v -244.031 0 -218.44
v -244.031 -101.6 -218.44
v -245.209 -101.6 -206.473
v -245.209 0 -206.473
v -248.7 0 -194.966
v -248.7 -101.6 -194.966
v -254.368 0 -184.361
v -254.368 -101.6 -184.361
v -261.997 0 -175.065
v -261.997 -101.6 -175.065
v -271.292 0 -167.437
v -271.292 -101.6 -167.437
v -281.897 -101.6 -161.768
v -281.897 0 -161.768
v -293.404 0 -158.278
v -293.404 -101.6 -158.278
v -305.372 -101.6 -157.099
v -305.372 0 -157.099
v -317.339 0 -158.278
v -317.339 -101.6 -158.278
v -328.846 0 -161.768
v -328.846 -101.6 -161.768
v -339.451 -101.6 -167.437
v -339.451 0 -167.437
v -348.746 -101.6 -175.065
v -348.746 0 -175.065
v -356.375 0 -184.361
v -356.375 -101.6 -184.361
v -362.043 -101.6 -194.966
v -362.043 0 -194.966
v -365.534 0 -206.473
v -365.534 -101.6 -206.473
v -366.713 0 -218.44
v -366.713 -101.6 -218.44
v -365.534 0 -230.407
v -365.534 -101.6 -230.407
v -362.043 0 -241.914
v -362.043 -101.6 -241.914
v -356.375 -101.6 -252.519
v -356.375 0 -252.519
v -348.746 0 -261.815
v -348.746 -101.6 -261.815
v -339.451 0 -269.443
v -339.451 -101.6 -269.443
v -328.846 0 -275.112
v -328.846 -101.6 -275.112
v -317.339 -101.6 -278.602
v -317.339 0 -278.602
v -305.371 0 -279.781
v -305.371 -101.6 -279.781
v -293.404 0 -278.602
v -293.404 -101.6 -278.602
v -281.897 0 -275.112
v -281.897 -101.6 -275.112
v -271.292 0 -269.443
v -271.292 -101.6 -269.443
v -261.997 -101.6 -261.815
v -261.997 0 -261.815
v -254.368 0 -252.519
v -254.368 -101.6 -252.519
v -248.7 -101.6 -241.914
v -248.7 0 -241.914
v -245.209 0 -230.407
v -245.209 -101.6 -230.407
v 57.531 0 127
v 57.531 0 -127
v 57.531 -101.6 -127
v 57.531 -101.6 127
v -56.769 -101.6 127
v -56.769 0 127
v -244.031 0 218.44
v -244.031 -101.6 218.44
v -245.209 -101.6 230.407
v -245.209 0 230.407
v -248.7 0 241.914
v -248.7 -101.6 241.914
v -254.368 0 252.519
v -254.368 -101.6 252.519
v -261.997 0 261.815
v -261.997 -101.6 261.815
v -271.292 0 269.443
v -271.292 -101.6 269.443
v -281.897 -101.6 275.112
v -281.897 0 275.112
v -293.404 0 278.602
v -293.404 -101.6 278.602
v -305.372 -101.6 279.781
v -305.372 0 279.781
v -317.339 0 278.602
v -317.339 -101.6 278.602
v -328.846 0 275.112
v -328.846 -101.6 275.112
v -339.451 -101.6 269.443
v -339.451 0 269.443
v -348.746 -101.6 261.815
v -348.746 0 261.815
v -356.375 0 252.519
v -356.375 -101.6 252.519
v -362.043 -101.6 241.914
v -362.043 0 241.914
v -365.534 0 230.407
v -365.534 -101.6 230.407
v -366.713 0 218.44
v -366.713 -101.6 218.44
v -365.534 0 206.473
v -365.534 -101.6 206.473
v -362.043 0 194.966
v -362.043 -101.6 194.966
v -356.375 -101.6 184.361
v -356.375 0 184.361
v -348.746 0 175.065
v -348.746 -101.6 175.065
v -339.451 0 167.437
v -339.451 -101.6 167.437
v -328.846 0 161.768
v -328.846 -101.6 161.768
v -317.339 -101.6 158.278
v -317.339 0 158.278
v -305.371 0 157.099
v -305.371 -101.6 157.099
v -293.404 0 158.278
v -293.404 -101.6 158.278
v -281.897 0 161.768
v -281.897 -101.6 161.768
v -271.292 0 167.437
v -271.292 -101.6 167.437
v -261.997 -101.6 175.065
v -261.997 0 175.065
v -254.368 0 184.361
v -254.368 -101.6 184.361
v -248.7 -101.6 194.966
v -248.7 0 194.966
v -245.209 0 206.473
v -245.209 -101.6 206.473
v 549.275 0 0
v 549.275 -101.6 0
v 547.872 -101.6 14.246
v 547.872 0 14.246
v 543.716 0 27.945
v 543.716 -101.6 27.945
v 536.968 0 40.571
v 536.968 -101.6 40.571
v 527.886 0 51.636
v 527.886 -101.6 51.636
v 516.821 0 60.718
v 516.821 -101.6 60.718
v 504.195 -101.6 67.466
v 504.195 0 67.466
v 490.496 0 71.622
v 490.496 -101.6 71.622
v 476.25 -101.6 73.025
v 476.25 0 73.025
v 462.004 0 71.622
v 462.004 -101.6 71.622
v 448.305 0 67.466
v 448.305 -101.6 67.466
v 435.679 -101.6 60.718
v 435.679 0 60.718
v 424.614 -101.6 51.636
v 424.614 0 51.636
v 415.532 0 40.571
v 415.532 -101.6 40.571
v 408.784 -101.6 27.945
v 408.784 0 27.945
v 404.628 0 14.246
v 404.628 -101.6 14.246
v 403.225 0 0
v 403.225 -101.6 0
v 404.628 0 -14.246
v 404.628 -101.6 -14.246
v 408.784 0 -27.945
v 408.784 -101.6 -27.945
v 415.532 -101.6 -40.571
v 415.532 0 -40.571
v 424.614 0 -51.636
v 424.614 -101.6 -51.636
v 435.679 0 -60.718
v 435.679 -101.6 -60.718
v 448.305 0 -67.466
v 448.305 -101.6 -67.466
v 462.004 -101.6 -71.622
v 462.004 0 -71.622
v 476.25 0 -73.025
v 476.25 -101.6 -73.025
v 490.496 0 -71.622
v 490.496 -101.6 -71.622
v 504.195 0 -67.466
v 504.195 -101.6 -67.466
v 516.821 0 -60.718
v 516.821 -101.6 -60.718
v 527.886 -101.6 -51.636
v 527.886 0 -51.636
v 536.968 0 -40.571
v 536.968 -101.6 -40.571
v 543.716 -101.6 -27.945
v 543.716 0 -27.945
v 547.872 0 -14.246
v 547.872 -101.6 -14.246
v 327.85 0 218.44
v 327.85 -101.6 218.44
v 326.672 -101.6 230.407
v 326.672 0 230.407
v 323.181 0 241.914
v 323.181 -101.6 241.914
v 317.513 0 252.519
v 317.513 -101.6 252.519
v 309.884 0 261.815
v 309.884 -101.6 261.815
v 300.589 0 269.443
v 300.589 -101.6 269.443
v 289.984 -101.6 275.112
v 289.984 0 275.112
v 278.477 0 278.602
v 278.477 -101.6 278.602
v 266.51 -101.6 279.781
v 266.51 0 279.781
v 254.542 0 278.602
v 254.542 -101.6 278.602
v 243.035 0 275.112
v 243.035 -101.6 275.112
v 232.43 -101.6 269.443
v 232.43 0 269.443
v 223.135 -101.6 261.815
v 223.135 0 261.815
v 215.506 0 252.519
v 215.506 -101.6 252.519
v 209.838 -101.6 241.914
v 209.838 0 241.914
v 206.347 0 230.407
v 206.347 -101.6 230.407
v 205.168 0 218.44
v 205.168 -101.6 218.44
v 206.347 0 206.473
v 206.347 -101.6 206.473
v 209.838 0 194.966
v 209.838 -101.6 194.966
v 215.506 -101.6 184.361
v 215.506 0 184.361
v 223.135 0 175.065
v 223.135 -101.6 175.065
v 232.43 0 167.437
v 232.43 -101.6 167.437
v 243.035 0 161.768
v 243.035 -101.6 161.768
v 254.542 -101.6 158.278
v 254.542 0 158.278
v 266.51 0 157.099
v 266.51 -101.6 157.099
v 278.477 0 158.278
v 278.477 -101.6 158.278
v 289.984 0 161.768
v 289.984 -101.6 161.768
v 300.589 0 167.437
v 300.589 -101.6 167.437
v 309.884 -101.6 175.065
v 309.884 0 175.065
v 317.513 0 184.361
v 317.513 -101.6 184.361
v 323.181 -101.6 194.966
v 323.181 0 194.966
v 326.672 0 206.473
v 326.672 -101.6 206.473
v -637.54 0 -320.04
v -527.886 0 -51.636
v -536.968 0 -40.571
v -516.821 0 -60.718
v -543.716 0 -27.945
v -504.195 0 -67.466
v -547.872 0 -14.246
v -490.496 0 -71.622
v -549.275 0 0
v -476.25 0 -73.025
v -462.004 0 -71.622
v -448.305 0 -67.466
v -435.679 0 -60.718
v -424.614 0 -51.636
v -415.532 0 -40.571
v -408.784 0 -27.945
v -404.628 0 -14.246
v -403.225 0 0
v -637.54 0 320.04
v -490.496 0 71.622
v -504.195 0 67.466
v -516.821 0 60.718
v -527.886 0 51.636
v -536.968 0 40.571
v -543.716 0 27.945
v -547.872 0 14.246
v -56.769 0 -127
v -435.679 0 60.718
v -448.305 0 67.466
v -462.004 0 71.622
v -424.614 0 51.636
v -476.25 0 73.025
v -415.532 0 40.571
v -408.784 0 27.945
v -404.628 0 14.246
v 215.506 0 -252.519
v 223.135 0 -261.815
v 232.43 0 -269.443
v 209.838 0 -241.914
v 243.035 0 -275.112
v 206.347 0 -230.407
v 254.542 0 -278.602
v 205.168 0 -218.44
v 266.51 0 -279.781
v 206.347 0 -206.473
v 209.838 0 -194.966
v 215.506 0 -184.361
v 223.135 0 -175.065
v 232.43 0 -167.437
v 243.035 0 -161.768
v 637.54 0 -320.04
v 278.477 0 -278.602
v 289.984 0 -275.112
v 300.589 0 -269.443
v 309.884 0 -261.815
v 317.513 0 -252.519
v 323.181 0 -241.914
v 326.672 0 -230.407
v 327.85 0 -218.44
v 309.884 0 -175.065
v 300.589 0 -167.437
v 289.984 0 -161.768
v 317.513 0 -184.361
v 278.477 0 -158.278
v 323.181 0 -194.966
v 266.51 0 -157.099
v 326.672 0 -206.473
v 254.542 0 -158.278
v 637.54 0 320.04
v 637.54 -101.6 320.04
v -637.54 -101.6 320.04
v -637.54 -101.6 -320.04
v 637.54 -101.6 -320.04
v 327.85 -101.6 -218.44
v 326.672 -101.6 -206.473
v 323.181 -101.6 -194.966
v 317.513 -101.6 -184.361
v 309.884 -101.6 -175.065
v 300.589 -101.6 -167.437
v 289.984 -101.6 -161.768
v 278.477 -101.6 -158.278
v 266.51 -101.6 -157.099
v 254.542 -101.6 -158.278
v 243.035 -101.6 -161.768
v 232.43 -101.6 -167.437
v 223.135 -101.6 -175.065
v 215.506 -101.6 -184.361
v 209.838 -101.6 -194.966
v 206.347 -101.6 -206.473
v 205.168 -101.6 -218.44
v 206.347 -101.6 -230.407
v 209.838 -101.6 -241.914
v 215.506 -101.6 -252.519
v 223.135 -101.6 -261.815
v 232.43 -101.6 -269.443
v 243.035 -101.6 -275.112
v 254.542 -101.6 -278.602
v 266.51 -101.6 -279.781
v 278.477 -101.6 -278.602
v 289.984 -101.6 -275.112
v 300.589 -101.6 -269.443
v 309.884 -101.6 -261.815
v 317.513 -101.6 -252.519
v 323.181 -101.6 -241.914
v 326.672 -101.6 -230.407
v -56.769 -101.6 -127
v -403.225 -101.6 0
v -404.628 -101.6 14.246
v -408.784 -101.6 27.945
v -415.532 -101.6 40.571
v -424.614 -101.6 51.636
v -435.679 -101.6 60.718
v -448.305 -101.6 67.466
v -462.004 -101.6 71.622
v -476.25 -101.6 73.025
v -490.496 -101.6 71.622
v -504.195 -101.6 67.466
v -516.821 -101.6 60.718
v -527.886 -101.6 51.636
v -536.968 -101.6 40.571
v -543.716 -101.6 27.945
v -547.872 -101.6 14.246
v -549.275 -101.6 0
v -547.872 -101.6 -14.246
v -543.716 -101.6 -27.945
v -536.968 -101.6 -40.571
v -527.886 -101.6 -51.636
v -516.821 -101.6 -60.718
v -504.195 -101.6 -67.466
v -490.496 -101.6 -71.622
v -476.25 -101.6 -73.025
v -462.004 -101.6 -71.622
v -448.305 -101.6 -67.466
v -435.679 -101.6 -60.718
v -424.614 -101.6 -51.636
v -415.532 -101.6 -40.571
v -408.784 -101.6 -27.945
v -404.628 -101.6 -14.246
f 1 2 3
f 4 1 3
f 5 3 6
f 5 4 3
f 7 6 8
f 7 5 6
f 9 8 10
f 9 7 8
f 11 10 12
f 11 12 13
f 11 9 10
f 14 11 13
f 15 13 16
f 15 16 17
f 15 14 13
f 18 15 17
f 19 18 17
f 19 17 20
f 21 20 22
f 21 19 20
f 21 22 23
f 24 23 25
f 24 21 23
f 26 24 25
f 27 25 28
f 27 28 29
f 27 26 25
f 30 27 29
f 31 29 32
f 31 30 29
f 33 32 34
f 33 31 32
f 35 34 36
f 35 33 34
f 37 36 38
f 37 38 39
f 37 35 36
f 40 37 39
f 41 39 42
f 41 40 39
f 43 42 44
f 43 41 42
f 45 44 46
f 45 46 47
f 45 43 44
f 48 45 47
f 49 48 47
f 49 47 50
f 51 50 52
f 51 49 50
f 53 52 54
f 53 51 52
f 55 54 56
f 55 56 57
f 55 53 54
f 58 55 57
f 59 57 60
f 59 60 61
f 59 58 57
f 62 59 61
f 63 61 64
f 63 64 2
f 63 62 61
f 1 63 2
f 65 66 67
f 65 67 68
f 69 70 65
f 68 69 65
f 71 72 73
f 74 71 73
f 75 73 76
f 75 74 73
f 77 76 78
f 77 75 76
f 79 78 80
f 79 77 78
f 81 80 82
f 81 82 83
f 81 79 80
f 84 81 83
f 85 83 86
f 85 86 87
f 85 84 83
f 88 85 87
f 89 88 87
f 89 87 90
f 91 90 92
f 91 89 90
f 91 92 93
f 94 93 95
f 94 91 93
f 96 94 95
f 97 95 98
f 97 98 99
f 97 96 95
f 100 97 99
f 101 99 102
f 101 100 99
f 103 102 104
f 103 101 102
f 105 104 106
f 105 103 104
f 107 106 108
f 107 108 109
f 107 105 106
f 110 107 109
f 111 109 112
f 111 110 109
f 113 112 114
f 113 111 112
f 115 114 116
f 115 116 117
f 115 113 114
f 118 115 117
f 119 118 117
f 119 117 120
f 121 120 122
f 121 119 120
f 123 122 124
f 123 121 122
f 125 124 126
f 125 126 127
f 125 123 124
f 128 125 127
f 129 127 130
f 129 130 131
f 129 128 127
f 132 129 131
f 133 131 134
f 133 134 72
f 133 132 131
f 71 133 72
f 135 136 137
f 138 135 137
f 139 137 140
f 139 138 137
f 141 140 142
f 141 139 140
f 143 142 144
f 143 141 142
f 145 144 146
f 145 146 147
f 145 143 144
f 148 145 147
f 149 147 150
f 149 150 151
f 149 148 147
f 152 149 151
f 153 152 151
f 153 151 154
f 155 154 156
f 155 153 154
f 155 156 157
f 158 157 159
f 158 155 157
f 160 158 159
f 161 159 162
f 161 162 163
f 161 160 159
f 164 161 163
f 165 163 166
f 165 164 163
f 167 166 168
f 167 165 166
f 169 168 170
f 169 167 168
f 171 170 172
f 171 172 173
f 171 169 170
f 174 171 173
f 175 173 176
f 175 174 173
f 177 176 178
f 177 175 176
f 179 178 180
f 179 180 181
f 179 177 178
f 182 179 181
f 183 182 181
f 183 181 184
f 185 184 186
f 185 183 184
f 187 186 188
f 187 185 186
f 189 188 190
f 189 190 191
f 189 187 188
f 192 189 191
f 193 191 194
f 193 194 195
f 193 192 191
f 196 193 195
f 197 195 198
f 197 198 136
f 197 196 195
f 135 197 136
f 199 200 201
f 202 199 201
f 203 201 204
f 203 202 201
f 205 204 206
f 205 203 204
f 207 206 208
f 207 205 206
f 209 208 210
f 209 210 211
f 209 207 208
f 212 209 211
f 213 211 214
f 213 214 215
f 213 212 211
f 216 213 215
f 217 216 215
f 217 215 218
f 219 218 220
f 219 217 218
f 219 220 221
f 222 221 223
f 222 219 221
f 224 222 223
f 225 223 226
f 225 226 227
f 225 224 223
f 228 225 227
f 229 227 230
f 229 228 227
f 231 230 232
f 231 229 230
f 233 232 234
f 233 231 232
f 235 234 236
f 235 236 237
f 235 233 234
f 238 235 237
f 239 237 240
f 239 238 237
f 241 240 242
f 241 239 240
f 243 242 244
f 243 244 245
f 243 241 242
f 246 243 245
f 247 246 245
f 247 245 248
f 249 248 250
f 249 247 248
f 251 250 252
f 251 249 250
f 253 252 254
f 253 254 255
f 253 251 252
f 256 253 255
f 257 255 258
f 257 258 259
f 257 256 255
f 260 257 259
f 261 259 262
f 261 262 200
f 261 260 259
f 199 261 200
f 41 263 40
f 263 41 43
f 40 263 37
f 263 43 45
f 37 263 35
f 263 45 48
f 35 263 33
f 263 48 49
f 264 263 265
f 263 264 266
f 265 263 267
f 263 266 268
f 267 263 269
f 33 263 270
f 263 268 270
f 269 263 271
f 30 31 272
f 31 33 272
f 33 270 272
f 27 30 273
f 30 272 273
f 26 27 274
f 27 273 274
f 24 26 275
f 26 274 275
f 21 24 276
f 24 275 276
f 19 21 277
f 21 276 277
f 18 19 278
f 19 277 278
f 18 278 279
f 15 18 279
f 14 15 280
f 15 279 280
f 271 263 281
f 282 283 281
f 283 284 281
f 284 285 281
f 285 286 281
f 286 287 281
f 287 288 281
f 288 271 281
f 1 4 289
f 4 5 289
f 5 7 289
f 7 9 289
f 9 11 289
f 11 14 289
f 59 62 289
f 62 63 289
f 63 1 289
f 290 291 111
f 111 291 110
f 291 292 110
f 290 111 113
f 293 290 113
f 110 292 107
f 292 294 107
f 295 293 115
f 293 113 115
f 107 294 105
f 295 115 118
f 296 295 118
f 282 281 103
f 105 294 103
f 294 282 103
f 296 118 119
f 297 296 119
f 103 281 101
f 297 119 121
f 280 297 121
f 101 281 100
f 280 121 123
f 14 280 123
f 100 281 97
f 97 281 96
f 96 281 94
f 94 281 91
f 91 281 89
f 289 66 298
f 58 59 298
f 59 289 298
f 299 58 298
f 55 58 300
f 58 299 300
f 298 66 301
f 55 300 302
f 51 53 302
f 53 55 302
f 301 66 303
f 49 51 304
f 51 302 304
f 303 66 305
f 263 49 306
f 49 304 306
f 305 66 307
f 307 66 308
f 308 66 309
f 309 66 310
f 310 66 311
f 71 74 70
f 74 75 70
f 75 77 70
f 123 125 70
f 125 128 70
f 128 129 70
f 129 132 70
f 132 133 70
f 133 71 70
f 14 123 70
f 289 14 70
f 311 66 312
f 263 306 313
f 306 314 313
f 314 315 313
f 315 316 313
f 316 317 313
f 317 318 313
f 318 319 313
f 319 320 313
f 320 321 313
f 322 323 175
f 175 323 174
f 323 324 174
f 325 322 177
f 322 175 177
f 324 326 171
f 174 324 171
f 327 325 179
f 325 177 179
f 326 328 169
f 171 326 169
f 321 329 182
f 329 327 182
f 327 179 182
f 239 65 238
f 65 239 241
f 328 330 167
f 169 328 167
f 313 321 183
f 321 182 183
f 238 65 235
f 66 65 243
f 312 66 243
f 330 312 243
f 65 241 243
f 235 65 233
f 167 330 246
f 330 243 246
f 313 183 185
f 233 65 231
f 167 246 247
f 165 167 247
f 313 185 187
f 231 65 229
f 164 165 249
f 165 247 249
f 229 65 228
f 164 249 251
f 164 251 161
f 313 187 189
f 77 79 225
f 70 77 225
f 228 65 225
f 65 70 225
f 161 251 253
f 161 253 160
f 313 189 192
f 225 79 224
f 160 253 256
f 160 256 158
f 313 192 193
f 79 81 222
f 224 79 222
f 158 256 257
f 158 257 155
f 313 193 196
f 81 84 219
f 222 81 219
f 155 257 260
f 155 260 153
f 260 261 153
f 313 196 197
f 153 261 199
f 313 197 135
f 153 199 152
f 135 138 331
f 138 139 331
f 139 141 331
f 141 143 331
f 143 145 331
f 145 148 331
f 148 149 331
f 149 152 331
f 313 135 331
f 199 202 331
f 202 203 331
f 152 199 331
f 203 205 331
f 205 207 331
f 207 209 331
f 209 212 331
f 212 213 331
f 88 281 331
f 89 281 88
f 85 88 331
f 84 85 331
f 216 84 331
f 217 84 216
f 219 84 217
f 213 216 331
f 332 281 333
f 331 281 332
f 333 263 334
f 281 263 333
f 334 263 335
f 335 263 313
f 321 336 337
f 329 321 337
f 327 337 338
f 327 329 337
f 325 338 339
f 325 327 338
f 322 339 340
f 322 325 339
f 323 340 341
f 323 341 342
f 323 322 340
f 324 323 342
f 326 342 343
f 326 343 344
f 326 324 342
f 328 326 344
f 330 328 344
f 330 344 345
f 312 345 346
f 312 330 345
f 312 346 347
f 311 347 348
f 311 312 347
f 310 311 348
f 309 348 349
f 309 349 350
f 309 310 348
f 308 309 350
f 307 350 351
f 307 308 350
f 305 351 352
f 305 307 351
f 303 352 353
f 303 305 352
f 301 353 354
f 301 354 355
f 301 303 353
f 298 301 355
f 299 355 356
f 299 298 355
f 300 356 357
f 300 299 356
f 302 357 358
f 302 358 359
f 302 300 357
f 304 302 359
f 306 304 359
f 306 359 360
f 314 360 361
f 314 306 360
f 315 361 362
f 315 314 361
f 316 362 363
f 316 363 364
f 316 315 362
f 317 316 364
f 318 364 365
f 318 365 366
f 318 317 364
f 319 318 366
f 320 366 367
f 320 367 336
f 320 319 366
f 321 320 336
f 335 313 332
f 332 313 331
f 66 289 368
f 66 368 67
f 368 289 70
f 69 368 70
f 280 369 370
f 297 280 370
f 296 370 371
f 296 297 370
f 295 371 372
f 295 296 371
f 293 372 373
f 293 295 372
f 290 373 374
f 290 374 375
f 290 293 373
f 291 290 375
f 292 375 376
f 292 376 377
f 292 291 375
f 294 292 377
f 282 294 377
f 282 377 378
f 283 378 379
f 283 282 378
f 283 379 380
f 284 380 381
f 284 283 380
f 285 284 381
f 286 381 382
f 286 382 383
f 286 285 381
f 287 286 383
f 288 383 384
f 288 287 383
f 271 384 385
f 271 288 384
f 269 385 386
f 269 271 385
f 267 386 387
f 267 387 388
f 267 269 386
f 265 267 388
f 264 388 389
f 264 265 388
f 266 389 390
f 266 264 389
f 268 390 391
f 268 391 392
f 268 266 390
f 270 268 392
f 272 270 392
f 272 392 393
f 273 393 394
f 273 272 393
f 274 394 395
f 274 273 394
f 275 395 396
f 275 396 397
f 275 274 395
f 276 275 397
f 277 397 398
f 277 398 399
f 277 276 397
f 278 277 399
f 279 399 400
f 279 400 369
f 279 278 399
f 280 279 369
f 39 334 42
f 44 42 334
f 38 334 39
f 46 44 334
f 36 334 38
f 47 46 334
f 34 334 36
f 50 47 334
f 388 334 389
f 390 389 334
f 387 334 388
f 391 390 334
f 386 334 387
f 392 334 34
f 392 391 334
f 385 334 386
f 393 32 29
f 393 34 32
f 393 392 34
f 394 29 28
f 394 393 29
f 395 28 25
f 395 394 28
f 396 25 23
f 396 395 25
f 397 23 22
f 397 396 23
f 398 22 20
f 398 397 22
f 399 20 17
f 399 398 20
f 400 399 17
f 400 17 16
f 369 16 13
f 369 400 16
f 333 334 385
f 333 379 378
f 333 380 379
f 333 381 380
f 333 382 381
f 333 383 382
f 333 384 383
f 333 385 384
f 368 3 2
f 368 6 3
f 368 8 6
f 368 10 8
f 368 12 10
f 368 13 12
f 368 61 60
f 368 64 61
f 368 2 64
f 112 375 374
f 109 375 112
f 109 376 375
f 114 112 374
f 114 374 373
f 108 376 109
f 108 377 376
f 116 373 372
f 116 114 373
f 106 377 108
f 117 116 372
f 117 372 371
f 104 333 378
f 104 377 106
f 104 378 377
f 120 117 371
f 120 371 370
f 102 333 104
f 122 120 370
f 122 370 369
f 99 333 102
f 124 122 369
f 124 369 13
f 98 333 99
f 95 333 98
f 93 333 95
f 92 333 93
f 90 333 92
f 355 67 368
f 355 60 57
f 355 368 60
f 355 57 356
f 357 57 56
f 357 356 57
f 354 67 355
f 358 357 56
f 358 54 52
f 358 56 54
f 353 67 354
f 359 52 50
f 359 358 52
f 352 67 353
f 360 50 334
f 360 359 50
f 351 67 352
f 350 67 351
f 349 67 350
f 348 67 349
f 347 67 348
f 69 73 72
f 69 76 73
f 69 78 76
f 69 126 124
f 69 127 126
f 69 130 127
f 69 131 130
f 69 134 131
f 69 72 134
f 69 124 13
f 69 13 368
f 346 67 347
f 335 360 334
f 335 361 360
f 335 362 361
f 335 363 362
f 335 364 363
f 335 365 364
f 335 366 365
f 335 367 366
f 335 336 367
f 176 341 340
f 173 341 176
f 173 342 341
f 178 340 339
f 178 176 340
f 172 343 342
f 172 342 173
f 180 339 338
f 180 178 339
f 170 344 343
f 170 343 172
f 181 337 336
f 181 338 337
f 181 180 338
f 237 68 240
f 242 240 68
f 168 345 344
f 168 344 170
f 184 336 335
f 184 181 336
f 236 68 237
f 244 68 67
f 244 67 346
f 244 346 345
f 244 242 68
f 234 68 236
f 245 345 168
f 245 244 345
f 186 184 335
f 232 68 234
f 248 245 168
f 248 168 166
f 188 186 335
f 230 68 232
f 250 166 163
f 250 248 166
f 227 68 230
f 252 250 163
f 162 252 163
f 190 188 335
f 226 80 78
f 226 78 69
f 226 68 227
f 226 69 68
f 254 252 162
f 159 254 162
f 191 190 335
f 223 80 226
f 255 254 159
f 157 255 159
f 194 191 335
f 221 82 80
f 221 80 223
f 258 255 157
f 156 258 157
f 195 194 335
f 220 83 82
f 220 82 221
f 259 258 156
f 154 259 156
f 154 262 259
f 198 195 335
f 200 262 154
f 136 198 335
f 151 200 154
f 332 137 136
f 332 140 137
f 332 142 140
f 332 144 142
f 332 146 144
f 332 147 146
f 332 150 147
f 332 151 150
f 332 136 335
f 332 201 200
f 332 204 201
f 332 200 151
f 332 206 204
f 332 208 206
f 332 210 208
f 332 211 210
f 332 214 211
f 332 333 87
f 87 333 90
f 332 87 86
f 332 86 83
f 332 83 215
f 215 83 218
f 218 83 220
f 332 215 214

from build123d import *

# Parameters (mm, degrees)
F0_W     = 1275.08
F0_H     = 640.08
F0_R     = 61.341
F0_R_2   = 73.025
F0_W_2   = 114.3
F0_H_2   = 254
F1_DEPTH = 101.6


with BuildPart() as f1:
    # F0 (on Front) → F1 (new body)
    with BuildSketch(Plane.XZ):
        Rectangle(F0_W, F0_H)
        with Locations((-305.3715, -218.44)):
            Circle(F0_R, mode=Mode.SUBTRACT)
        with Locations((266.5095, -218.44)):
            Circle(F0_R, mode=Mode.SUBTRACT)
        with Locations((-476.25, 0)):
            Circle(F0_R_2, mode=Mode.SUBTRACT)
        with Locations((-305.3715, 218.44)):
            Circle(F0_R, mode=Mode.SUBTRACT)
        with Locations((0.381, 0)):
            Rectangle(F0_W_2, F0_H_2, mode=Mode.SUBTRACT)
        with Locations((476.25, 0)):
            Circle(F0_R_2, mode=Mode.SUBTRACT)
        with Locations((266.5095, 218.44)):
            Circle(F0_R, mode=Mode.SUBTRACT)
    extrude(amount=F1_DEPTH)


solid = f1.part
